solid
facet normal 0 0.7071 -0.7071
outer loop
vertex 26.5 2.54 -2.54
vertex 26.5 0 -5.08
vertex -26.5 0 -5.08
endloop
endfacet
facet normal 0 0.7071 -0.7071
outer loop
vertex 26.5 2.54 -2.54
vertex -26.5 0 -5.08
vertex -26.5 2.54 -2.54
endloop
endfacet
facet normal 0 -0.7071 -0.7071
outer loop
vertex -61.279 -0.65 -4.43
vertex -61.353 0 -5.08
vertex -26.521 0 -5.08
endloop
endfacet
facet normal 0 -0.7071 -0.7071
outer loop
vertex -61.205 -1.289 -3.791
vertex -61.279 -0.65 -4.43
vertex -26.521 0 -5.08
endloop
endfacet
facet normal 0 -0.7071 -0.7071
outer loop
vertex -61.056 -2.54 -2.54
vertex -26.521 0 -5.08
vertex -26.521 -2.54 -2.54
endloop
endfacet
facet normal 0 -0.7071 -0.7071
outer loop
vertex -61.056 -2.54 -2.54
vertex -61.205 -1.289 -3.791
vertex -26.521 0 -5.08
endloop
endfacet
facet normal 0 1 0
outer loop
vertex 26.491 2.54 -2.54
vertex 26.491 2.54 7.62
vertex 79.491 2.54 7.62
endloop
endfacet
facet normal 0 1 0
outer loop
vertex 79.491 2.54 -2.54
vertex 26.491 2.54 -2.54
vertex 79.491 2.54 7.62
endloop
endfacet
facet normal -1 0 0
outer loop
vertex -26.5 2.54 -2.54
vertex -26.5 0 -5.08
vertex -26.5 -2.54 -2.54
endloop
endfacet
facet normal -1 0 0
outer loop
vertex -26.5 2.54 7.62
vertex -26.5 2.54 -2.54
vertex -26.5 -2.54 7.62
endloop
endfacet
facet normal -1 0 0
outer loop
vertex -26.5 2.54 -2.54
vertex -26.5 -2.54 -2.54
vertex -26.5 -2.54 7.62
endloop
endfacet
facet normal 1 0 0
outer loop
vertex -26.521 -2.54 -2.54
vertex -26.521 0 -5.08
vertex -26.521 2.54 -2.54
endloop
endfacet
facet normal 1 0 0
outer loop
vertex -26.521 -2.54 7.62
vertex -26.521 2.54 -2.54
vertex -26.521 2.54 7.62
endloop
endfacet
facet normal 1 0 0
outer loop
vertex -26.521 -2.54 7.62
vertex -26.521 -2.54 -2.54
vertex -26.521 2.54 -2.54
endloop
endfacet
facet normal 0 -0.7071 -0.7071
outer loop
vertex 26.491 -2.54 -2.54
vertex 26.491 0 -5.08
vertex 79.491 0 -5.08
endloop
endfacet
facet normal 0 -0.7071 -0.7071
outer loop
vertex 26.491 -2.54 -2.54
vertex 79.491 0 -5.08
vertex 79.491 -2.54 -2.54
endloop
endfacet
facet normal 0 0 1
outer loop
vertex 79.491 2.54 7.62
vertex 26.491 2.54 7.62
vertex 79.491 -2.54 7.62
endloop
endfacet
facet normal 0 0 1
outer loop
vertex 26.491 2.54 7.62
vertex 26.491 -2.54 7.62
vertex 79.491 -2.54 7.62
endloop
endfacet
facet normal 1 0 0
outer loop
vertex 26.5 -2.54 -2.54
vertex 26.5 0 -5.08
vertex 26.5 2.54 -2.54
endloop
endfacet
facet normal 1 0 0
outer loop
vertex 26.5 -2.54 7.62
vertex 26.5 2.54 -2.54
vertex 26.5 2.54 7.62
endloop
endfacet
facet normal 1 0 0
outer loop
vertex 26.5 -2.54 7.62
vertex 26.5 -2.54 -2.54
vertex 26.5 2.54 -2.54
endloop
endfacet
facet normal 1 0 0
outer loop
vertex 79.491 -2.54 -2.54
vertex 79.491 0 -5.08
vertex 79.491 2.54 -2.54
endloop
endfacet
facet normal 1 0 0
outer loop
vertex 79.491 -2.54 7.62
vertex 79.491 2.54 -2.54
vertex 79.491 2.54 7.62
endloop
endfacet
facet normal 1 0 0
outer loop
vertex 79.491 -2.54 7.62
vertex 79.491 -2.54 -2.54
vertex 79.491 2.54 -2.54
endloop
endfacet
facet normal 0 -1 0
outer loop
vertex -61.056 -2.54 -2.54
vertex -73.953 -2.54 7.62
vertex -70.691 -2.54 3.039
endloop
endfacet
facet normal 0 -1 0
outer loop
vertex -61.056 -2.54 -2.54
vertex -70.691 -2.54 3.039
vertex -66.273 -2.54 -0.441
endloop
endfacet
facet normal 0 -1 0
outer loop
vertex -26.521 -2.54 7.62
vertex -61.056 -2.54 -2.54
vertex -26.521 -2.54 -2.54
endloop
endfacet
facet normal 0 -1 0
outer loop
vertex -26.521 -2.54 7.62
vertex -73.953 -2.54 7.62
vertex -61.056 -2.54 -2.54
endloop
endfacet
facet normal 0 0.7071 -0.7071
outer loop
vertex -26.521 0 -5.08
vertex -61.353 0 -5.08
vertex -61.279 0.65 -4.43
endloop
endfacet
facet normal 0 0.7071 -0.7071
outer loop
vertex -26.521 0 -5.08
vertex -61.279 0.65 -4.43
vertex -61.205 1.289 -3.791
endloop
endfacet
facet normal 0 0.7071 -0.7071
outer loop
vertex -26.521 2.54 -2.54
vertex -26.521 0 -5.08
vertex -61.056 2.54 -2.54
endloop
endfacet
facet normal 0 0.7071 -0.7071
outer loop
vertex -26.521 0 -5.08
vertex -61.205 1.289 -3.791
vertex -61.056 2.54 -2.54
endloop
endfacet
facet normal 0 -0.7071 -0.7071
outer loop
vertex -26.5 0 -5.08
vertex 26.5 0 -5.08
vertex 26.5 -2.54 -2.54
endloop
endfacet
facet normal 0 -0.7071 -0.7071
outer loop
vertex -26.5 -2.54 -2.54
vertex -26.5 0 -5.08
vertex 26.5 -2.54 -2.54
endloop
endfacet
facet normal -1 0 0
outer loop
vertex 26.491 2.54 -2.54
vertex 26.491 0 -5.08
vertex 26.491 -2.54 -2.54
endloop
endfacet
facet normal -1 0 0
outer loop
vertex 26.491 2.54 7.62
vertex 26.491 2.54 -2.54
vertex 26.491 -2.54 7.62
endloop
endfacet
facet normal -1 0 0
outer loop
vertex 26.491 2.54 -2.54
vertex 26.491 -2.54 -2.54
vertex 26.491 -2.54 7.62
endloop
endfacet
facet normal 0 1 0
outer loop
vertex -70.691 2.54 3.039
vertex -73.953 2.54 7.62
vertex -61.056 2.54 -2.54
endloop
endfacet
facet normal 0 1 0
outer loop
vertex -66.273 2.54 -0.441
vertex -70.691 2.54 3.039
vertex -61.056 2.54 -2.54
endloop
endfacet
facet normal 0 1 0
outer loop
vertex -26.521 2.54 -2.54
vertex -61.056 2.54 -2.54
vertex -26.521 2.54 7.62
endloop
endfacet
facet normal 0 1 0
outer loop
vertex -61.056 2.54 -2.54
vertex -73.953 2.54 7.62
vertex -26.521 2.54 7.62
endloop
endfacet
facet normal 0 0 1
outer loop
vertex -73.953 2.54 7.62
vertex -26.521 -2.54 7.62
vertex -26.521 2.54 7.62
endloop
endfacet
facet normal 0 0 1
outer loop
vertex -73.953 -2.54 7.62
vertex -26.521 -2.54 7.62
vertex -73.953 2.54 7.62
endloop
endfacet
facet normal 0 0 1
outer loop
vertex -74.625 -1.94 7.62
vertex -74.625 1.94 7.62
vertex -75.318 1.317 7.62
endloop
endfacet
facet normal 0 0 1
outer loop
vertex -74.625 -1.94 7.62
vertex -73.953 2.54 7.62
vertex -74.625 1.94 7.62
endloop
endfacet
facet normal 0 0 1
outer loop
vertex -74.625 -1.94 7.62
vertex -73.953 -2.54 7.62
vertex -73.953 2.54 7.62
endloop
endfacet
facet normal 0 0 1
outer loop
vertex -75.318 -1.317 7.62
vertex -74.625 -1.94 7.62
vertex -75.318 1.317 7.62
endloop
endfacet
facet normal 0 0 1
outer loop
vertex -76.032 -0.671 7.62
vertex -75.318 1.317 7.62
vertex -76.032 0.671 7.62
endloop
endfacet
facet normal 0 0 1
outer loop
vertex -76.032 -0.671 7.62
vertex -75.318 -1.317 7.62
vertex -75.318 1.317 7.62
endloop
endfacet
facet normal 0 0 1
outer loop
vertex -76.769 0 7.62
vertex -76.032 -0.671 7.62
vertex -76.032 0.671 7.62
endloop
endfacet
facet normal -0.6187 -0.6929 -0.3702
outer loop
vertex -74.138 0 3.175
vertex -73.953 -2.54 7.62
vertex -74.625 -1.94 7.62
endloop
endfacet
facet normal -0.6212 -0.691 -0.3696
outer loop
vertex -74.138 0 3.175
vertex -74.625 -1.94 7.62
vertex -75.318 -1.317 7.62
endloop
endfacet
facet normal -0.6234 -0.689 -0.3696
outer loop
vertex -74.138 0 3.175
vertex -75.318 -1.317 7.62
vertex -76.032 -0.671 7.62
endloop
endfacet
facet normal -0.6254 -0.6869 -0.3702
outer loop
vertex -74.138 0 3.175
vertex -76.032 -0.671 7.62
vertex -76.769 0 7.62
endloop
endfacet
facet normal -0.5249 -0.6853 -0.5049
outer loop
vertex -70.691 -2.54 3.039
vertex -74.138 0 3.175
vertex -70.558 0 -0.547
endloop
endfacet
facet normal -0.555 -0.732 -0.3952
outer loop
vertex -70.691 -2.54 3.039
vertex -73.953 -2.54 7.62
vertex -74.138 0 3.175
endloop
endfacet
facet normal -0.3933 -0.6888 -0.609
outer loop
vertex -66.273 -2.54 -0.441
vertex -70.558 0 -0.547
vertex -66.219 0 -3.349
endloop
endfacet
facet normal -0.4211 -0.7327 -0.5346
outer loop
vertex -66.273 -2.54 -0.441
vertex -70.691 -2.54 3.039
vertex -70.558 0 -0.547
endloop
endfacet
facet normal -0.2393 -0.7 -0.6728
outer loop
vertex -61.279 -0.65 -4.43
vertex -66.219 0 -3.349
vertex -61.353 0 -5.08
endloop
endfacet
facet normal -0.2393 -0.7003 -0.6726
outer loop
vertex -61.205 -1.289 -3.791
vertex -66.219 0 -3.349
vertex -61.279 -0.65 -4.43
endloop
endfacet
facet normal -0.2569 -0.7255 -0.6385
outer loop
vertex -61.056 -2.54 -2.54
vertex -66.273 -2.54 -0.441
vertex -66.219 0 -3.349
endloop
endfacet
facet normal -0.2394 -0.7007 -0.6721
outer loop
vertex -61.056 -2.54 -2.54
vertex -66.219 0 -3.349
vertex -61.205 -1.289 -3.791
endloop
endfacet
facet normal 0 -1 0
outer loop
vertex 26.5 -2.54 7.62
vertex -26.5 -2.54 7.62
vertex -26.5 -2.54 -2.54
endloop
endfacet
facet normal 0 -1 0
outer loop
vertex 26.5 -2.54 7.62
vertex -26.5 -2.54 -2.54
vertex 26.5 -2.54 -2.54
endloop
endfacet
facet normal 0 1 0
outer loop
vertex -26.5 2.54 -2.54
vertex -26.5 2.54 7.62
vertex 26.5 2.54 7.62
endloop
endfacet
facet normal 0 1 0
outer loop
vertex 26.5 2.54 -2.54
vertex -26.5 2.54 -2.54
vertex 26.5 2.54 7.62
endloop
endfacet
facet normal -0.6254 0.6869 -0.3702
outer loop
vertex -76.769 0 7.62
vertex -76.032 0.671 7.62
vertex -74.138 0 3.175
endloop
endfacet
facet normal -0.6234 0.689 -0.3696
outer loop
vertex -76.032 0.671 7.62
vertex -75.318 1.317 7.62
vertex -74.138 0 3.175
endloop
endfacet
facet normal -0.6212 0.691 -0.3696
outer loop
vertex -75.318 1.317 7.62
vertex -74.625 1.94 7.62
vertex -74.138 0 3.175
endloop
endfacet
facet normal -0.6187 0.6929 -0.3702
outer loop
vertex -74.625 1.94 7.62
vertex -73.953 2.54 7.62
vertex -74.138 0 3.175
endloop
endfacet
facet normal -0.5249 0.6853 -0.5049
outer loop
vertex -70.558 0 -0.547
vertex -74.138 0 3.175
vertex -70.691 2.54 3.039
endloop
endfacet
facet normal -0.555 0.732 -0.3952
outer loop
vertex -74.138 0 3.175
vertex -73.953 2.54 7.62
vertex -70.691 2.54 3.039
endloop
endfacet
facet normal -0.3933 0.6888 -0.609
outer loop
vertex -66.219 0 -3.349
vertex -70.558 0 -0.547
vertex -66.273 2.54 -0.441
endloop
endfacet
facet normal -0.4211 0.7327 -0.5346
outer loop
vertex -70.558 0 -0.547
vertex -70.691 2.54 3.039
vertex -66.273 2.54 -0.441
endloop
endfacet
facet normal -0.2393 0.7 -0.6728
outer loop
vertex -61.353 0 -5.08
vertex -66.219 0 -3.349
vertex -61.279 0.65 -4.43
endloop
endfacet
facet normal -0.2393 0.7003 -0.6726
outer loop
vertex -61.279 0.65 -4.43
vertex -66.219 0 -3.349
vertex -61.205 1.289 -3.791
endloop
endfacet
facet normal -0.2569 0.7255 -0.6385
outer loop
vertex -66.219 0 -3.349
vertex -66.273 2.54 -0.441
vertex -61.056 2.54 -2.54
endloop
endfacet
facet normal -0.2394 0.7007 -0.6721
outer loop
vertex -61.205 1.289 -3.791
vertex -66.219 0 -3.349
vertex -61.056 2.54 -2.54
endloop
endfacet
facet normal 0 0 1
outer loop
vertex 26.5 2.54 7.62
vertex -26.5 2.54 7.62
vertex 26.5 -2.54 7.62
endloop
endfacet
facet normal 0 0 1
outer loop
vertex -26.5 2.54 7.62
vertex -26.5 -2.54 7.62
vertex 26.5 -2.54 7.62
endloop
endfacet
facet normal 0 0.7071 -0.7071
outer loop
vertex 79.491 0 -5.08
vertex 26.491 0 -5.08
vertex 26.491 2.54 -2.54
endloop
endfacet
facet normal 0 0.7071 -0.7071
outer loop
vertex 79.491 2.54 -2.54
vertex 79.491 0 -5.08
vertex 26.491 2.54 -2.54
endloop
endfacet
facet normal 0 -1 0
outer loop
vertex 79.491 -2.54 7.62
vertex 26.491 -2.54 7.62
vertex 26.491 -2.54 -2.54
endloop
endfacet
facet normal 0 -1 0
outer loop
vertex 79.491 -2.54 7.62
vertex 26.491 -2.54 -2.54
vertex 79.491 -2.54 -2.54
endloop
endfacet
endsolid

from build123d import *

# Parameters (mm, degrees)
F0_W          = 53
F0_H          = 15.24
F1_DEPTH      = 2.54
F1_DEPTH_BACK = 2.54
F3_DEPTH      = 2.54
F3_DEPTH_BACK = 2.54
F4_W          = 53
F4_H          = 15.24
F5_DEPTH      = 2.54
F5_DEPTH_BACK = 2.54
F6_T1_DEPTH   = 61.2405111475
F6_2_T1_DEPTH = 79.1282991577
F6_3_T1_DEPTH = 79.1282991577
F7_T2_ANGLE   = 87.5032062874
F7_T4_ANGLE   = 87.5032062874


# Not quite as in the source:
# - a fillet or chamfer that OpenCascade refuses, or shapes differently, is made with other operations: its cross-section is extruded or revolved along the edge and cut away or added


with BuildPart() as f1:
    # F0 (on Front) → F1 (new body, two sides)
    with BuildSketch(Plane.XZ) as f1_sk:
        Rectangle(F0_W, F0_H)
    extrude(amount=F1_DEPTH)
    extrude(f1_sk.sketch, amount=-F1_DEPTH_BACK)

    # F6#2: chamfer of 5.08 on 2 edges, made by hand

    # F6_2_s2 → F6_2_t1 (cut)
    with BuildSketch(Plane.YZ.offset(-39.5641495789)):
        Polygon((2.54, -7.62), (-2.54, -2.54), (-2.54, -7.62), align=None)
        Polygon((-2.54, -7.62), (2.54, -2.54), (2.54, -7.62), align=None)
    extrude(amount=F6_2_T1_DEPTH, mode=Mode.SUBTRACT)


with BuildPart() as f3:
    # F2 (on Front) → F3 (new body, two sides)
    with BuildSketch(Plane.XZ) as f3_sk:
        with BuildLine():
            Line((-61.6335310042, -7.62), (-26.5213190144, -7.62))
            Line((-26.5213190144, -7.62), (-26.5213190144, 7.62))
            Line((-26.5213190144, 7.62), (-79.2149826884, 7.62))
            Line((-79.2149826884, 7.62), (-79.2149826884, 6.8744295258))
            ThreePointArc((-79.2149826884, 6.8744295258), (-72.179765207, -2.5021815938), (-61.6335310042, -7.62))
        make_face()
    extrude(amount=F3_DEPTH)
    extrude(f3_sk.sketch, amount=-F3_DEPTH_BACK)

    # F6: chamfer of 5.08 on 2 edges, made by hand

    # F6_s2 → F6_t1 (cut)
    with BuildSketch(Plane.YZ.offset(-74.6976805831)):
        Polygon((2.54, -7.62), (-2.54, -2.54), (-2.54, -7.62), align=None)
        Polygon((-2.54, -7.62), (2.54, -2.54), (2.54, -7.62), align=None)
    extrude(amount=F6_T1_DEPTH, mode=Mode.SUBTRACT)

    # F7: chamfer of 5.08 on 2 edges, made by hand

    # F7_s1 → F7_t2 (revolve, cut)
    with BuildSketch(Plane(origin=(1.1745778192, 0, 9.8467873874), x_dir=(0, 1, 0), z_dir=(0.118445679, 0, 0.9929605335))):
        Polygon((2.54, 82.8215486164), (-2.54, 77.7415486164), (-2.54, 82.8215486164), align=None)
    revolve(axis=Axis((-56.3427767118, -2.54, 16.7077671356), (0, -1, 0)), revolution_arc=F7_T2_ANGLE, mode=Mode.SUBTRACT)

    # F7_s3 → F7_t4 (revolve, cut)
    with BuildSketch(Plane(origin=(1.1745778192, 0, 9.8467873874), x_dir=(0, 1, 0), z_dir=(0.118445679, 0, 0.9929605335))):
        Polygon((-2.54, 82.8215486164), (2.54, 77.7415486164), (2.54, 82.8215486164), align=None)
    revolve(axis=Axis((-56.3427767118, 2.54, 16.7077671356), (0, -1, 0)), revolution_arc=F7_T4_ANGLE, mode=Mode.SUBTRACT)


with BuildPart() as f5:
    # F4 (on Front) → F5 (new body, two sides)
    with BuildSketch(Plane.XZ) as f5_sk:
        with Locations((52.9905296862, 0)):
            Rectangle(F4_W, F4_H)
    extrude(amount=F5_DEPTH)
    extrude(f5_sk.sketch, amount=-F5_DEPTH_BACK)

    # F6#3: chamfer of 5.08 on 2 edges, made by hand

    # F6_3_s2 → F6_3_t1 (cut)
    with BuildSketch(Plane.YZ.offset(13.4263801073)):
        Polygon((-2.54, -7.62), (2.54, -2.54), (2.54, -7.62), align=None)
        Polygon((2.54, -7.62), (-2.54, -2.54), (-2.54, -7.62), align=None)
    extrude(amount=F6_3_T1_DEPTH, mode=Mode.SUBTRACT)


solid = Compound([f1.part, f3.part, f5.part])
